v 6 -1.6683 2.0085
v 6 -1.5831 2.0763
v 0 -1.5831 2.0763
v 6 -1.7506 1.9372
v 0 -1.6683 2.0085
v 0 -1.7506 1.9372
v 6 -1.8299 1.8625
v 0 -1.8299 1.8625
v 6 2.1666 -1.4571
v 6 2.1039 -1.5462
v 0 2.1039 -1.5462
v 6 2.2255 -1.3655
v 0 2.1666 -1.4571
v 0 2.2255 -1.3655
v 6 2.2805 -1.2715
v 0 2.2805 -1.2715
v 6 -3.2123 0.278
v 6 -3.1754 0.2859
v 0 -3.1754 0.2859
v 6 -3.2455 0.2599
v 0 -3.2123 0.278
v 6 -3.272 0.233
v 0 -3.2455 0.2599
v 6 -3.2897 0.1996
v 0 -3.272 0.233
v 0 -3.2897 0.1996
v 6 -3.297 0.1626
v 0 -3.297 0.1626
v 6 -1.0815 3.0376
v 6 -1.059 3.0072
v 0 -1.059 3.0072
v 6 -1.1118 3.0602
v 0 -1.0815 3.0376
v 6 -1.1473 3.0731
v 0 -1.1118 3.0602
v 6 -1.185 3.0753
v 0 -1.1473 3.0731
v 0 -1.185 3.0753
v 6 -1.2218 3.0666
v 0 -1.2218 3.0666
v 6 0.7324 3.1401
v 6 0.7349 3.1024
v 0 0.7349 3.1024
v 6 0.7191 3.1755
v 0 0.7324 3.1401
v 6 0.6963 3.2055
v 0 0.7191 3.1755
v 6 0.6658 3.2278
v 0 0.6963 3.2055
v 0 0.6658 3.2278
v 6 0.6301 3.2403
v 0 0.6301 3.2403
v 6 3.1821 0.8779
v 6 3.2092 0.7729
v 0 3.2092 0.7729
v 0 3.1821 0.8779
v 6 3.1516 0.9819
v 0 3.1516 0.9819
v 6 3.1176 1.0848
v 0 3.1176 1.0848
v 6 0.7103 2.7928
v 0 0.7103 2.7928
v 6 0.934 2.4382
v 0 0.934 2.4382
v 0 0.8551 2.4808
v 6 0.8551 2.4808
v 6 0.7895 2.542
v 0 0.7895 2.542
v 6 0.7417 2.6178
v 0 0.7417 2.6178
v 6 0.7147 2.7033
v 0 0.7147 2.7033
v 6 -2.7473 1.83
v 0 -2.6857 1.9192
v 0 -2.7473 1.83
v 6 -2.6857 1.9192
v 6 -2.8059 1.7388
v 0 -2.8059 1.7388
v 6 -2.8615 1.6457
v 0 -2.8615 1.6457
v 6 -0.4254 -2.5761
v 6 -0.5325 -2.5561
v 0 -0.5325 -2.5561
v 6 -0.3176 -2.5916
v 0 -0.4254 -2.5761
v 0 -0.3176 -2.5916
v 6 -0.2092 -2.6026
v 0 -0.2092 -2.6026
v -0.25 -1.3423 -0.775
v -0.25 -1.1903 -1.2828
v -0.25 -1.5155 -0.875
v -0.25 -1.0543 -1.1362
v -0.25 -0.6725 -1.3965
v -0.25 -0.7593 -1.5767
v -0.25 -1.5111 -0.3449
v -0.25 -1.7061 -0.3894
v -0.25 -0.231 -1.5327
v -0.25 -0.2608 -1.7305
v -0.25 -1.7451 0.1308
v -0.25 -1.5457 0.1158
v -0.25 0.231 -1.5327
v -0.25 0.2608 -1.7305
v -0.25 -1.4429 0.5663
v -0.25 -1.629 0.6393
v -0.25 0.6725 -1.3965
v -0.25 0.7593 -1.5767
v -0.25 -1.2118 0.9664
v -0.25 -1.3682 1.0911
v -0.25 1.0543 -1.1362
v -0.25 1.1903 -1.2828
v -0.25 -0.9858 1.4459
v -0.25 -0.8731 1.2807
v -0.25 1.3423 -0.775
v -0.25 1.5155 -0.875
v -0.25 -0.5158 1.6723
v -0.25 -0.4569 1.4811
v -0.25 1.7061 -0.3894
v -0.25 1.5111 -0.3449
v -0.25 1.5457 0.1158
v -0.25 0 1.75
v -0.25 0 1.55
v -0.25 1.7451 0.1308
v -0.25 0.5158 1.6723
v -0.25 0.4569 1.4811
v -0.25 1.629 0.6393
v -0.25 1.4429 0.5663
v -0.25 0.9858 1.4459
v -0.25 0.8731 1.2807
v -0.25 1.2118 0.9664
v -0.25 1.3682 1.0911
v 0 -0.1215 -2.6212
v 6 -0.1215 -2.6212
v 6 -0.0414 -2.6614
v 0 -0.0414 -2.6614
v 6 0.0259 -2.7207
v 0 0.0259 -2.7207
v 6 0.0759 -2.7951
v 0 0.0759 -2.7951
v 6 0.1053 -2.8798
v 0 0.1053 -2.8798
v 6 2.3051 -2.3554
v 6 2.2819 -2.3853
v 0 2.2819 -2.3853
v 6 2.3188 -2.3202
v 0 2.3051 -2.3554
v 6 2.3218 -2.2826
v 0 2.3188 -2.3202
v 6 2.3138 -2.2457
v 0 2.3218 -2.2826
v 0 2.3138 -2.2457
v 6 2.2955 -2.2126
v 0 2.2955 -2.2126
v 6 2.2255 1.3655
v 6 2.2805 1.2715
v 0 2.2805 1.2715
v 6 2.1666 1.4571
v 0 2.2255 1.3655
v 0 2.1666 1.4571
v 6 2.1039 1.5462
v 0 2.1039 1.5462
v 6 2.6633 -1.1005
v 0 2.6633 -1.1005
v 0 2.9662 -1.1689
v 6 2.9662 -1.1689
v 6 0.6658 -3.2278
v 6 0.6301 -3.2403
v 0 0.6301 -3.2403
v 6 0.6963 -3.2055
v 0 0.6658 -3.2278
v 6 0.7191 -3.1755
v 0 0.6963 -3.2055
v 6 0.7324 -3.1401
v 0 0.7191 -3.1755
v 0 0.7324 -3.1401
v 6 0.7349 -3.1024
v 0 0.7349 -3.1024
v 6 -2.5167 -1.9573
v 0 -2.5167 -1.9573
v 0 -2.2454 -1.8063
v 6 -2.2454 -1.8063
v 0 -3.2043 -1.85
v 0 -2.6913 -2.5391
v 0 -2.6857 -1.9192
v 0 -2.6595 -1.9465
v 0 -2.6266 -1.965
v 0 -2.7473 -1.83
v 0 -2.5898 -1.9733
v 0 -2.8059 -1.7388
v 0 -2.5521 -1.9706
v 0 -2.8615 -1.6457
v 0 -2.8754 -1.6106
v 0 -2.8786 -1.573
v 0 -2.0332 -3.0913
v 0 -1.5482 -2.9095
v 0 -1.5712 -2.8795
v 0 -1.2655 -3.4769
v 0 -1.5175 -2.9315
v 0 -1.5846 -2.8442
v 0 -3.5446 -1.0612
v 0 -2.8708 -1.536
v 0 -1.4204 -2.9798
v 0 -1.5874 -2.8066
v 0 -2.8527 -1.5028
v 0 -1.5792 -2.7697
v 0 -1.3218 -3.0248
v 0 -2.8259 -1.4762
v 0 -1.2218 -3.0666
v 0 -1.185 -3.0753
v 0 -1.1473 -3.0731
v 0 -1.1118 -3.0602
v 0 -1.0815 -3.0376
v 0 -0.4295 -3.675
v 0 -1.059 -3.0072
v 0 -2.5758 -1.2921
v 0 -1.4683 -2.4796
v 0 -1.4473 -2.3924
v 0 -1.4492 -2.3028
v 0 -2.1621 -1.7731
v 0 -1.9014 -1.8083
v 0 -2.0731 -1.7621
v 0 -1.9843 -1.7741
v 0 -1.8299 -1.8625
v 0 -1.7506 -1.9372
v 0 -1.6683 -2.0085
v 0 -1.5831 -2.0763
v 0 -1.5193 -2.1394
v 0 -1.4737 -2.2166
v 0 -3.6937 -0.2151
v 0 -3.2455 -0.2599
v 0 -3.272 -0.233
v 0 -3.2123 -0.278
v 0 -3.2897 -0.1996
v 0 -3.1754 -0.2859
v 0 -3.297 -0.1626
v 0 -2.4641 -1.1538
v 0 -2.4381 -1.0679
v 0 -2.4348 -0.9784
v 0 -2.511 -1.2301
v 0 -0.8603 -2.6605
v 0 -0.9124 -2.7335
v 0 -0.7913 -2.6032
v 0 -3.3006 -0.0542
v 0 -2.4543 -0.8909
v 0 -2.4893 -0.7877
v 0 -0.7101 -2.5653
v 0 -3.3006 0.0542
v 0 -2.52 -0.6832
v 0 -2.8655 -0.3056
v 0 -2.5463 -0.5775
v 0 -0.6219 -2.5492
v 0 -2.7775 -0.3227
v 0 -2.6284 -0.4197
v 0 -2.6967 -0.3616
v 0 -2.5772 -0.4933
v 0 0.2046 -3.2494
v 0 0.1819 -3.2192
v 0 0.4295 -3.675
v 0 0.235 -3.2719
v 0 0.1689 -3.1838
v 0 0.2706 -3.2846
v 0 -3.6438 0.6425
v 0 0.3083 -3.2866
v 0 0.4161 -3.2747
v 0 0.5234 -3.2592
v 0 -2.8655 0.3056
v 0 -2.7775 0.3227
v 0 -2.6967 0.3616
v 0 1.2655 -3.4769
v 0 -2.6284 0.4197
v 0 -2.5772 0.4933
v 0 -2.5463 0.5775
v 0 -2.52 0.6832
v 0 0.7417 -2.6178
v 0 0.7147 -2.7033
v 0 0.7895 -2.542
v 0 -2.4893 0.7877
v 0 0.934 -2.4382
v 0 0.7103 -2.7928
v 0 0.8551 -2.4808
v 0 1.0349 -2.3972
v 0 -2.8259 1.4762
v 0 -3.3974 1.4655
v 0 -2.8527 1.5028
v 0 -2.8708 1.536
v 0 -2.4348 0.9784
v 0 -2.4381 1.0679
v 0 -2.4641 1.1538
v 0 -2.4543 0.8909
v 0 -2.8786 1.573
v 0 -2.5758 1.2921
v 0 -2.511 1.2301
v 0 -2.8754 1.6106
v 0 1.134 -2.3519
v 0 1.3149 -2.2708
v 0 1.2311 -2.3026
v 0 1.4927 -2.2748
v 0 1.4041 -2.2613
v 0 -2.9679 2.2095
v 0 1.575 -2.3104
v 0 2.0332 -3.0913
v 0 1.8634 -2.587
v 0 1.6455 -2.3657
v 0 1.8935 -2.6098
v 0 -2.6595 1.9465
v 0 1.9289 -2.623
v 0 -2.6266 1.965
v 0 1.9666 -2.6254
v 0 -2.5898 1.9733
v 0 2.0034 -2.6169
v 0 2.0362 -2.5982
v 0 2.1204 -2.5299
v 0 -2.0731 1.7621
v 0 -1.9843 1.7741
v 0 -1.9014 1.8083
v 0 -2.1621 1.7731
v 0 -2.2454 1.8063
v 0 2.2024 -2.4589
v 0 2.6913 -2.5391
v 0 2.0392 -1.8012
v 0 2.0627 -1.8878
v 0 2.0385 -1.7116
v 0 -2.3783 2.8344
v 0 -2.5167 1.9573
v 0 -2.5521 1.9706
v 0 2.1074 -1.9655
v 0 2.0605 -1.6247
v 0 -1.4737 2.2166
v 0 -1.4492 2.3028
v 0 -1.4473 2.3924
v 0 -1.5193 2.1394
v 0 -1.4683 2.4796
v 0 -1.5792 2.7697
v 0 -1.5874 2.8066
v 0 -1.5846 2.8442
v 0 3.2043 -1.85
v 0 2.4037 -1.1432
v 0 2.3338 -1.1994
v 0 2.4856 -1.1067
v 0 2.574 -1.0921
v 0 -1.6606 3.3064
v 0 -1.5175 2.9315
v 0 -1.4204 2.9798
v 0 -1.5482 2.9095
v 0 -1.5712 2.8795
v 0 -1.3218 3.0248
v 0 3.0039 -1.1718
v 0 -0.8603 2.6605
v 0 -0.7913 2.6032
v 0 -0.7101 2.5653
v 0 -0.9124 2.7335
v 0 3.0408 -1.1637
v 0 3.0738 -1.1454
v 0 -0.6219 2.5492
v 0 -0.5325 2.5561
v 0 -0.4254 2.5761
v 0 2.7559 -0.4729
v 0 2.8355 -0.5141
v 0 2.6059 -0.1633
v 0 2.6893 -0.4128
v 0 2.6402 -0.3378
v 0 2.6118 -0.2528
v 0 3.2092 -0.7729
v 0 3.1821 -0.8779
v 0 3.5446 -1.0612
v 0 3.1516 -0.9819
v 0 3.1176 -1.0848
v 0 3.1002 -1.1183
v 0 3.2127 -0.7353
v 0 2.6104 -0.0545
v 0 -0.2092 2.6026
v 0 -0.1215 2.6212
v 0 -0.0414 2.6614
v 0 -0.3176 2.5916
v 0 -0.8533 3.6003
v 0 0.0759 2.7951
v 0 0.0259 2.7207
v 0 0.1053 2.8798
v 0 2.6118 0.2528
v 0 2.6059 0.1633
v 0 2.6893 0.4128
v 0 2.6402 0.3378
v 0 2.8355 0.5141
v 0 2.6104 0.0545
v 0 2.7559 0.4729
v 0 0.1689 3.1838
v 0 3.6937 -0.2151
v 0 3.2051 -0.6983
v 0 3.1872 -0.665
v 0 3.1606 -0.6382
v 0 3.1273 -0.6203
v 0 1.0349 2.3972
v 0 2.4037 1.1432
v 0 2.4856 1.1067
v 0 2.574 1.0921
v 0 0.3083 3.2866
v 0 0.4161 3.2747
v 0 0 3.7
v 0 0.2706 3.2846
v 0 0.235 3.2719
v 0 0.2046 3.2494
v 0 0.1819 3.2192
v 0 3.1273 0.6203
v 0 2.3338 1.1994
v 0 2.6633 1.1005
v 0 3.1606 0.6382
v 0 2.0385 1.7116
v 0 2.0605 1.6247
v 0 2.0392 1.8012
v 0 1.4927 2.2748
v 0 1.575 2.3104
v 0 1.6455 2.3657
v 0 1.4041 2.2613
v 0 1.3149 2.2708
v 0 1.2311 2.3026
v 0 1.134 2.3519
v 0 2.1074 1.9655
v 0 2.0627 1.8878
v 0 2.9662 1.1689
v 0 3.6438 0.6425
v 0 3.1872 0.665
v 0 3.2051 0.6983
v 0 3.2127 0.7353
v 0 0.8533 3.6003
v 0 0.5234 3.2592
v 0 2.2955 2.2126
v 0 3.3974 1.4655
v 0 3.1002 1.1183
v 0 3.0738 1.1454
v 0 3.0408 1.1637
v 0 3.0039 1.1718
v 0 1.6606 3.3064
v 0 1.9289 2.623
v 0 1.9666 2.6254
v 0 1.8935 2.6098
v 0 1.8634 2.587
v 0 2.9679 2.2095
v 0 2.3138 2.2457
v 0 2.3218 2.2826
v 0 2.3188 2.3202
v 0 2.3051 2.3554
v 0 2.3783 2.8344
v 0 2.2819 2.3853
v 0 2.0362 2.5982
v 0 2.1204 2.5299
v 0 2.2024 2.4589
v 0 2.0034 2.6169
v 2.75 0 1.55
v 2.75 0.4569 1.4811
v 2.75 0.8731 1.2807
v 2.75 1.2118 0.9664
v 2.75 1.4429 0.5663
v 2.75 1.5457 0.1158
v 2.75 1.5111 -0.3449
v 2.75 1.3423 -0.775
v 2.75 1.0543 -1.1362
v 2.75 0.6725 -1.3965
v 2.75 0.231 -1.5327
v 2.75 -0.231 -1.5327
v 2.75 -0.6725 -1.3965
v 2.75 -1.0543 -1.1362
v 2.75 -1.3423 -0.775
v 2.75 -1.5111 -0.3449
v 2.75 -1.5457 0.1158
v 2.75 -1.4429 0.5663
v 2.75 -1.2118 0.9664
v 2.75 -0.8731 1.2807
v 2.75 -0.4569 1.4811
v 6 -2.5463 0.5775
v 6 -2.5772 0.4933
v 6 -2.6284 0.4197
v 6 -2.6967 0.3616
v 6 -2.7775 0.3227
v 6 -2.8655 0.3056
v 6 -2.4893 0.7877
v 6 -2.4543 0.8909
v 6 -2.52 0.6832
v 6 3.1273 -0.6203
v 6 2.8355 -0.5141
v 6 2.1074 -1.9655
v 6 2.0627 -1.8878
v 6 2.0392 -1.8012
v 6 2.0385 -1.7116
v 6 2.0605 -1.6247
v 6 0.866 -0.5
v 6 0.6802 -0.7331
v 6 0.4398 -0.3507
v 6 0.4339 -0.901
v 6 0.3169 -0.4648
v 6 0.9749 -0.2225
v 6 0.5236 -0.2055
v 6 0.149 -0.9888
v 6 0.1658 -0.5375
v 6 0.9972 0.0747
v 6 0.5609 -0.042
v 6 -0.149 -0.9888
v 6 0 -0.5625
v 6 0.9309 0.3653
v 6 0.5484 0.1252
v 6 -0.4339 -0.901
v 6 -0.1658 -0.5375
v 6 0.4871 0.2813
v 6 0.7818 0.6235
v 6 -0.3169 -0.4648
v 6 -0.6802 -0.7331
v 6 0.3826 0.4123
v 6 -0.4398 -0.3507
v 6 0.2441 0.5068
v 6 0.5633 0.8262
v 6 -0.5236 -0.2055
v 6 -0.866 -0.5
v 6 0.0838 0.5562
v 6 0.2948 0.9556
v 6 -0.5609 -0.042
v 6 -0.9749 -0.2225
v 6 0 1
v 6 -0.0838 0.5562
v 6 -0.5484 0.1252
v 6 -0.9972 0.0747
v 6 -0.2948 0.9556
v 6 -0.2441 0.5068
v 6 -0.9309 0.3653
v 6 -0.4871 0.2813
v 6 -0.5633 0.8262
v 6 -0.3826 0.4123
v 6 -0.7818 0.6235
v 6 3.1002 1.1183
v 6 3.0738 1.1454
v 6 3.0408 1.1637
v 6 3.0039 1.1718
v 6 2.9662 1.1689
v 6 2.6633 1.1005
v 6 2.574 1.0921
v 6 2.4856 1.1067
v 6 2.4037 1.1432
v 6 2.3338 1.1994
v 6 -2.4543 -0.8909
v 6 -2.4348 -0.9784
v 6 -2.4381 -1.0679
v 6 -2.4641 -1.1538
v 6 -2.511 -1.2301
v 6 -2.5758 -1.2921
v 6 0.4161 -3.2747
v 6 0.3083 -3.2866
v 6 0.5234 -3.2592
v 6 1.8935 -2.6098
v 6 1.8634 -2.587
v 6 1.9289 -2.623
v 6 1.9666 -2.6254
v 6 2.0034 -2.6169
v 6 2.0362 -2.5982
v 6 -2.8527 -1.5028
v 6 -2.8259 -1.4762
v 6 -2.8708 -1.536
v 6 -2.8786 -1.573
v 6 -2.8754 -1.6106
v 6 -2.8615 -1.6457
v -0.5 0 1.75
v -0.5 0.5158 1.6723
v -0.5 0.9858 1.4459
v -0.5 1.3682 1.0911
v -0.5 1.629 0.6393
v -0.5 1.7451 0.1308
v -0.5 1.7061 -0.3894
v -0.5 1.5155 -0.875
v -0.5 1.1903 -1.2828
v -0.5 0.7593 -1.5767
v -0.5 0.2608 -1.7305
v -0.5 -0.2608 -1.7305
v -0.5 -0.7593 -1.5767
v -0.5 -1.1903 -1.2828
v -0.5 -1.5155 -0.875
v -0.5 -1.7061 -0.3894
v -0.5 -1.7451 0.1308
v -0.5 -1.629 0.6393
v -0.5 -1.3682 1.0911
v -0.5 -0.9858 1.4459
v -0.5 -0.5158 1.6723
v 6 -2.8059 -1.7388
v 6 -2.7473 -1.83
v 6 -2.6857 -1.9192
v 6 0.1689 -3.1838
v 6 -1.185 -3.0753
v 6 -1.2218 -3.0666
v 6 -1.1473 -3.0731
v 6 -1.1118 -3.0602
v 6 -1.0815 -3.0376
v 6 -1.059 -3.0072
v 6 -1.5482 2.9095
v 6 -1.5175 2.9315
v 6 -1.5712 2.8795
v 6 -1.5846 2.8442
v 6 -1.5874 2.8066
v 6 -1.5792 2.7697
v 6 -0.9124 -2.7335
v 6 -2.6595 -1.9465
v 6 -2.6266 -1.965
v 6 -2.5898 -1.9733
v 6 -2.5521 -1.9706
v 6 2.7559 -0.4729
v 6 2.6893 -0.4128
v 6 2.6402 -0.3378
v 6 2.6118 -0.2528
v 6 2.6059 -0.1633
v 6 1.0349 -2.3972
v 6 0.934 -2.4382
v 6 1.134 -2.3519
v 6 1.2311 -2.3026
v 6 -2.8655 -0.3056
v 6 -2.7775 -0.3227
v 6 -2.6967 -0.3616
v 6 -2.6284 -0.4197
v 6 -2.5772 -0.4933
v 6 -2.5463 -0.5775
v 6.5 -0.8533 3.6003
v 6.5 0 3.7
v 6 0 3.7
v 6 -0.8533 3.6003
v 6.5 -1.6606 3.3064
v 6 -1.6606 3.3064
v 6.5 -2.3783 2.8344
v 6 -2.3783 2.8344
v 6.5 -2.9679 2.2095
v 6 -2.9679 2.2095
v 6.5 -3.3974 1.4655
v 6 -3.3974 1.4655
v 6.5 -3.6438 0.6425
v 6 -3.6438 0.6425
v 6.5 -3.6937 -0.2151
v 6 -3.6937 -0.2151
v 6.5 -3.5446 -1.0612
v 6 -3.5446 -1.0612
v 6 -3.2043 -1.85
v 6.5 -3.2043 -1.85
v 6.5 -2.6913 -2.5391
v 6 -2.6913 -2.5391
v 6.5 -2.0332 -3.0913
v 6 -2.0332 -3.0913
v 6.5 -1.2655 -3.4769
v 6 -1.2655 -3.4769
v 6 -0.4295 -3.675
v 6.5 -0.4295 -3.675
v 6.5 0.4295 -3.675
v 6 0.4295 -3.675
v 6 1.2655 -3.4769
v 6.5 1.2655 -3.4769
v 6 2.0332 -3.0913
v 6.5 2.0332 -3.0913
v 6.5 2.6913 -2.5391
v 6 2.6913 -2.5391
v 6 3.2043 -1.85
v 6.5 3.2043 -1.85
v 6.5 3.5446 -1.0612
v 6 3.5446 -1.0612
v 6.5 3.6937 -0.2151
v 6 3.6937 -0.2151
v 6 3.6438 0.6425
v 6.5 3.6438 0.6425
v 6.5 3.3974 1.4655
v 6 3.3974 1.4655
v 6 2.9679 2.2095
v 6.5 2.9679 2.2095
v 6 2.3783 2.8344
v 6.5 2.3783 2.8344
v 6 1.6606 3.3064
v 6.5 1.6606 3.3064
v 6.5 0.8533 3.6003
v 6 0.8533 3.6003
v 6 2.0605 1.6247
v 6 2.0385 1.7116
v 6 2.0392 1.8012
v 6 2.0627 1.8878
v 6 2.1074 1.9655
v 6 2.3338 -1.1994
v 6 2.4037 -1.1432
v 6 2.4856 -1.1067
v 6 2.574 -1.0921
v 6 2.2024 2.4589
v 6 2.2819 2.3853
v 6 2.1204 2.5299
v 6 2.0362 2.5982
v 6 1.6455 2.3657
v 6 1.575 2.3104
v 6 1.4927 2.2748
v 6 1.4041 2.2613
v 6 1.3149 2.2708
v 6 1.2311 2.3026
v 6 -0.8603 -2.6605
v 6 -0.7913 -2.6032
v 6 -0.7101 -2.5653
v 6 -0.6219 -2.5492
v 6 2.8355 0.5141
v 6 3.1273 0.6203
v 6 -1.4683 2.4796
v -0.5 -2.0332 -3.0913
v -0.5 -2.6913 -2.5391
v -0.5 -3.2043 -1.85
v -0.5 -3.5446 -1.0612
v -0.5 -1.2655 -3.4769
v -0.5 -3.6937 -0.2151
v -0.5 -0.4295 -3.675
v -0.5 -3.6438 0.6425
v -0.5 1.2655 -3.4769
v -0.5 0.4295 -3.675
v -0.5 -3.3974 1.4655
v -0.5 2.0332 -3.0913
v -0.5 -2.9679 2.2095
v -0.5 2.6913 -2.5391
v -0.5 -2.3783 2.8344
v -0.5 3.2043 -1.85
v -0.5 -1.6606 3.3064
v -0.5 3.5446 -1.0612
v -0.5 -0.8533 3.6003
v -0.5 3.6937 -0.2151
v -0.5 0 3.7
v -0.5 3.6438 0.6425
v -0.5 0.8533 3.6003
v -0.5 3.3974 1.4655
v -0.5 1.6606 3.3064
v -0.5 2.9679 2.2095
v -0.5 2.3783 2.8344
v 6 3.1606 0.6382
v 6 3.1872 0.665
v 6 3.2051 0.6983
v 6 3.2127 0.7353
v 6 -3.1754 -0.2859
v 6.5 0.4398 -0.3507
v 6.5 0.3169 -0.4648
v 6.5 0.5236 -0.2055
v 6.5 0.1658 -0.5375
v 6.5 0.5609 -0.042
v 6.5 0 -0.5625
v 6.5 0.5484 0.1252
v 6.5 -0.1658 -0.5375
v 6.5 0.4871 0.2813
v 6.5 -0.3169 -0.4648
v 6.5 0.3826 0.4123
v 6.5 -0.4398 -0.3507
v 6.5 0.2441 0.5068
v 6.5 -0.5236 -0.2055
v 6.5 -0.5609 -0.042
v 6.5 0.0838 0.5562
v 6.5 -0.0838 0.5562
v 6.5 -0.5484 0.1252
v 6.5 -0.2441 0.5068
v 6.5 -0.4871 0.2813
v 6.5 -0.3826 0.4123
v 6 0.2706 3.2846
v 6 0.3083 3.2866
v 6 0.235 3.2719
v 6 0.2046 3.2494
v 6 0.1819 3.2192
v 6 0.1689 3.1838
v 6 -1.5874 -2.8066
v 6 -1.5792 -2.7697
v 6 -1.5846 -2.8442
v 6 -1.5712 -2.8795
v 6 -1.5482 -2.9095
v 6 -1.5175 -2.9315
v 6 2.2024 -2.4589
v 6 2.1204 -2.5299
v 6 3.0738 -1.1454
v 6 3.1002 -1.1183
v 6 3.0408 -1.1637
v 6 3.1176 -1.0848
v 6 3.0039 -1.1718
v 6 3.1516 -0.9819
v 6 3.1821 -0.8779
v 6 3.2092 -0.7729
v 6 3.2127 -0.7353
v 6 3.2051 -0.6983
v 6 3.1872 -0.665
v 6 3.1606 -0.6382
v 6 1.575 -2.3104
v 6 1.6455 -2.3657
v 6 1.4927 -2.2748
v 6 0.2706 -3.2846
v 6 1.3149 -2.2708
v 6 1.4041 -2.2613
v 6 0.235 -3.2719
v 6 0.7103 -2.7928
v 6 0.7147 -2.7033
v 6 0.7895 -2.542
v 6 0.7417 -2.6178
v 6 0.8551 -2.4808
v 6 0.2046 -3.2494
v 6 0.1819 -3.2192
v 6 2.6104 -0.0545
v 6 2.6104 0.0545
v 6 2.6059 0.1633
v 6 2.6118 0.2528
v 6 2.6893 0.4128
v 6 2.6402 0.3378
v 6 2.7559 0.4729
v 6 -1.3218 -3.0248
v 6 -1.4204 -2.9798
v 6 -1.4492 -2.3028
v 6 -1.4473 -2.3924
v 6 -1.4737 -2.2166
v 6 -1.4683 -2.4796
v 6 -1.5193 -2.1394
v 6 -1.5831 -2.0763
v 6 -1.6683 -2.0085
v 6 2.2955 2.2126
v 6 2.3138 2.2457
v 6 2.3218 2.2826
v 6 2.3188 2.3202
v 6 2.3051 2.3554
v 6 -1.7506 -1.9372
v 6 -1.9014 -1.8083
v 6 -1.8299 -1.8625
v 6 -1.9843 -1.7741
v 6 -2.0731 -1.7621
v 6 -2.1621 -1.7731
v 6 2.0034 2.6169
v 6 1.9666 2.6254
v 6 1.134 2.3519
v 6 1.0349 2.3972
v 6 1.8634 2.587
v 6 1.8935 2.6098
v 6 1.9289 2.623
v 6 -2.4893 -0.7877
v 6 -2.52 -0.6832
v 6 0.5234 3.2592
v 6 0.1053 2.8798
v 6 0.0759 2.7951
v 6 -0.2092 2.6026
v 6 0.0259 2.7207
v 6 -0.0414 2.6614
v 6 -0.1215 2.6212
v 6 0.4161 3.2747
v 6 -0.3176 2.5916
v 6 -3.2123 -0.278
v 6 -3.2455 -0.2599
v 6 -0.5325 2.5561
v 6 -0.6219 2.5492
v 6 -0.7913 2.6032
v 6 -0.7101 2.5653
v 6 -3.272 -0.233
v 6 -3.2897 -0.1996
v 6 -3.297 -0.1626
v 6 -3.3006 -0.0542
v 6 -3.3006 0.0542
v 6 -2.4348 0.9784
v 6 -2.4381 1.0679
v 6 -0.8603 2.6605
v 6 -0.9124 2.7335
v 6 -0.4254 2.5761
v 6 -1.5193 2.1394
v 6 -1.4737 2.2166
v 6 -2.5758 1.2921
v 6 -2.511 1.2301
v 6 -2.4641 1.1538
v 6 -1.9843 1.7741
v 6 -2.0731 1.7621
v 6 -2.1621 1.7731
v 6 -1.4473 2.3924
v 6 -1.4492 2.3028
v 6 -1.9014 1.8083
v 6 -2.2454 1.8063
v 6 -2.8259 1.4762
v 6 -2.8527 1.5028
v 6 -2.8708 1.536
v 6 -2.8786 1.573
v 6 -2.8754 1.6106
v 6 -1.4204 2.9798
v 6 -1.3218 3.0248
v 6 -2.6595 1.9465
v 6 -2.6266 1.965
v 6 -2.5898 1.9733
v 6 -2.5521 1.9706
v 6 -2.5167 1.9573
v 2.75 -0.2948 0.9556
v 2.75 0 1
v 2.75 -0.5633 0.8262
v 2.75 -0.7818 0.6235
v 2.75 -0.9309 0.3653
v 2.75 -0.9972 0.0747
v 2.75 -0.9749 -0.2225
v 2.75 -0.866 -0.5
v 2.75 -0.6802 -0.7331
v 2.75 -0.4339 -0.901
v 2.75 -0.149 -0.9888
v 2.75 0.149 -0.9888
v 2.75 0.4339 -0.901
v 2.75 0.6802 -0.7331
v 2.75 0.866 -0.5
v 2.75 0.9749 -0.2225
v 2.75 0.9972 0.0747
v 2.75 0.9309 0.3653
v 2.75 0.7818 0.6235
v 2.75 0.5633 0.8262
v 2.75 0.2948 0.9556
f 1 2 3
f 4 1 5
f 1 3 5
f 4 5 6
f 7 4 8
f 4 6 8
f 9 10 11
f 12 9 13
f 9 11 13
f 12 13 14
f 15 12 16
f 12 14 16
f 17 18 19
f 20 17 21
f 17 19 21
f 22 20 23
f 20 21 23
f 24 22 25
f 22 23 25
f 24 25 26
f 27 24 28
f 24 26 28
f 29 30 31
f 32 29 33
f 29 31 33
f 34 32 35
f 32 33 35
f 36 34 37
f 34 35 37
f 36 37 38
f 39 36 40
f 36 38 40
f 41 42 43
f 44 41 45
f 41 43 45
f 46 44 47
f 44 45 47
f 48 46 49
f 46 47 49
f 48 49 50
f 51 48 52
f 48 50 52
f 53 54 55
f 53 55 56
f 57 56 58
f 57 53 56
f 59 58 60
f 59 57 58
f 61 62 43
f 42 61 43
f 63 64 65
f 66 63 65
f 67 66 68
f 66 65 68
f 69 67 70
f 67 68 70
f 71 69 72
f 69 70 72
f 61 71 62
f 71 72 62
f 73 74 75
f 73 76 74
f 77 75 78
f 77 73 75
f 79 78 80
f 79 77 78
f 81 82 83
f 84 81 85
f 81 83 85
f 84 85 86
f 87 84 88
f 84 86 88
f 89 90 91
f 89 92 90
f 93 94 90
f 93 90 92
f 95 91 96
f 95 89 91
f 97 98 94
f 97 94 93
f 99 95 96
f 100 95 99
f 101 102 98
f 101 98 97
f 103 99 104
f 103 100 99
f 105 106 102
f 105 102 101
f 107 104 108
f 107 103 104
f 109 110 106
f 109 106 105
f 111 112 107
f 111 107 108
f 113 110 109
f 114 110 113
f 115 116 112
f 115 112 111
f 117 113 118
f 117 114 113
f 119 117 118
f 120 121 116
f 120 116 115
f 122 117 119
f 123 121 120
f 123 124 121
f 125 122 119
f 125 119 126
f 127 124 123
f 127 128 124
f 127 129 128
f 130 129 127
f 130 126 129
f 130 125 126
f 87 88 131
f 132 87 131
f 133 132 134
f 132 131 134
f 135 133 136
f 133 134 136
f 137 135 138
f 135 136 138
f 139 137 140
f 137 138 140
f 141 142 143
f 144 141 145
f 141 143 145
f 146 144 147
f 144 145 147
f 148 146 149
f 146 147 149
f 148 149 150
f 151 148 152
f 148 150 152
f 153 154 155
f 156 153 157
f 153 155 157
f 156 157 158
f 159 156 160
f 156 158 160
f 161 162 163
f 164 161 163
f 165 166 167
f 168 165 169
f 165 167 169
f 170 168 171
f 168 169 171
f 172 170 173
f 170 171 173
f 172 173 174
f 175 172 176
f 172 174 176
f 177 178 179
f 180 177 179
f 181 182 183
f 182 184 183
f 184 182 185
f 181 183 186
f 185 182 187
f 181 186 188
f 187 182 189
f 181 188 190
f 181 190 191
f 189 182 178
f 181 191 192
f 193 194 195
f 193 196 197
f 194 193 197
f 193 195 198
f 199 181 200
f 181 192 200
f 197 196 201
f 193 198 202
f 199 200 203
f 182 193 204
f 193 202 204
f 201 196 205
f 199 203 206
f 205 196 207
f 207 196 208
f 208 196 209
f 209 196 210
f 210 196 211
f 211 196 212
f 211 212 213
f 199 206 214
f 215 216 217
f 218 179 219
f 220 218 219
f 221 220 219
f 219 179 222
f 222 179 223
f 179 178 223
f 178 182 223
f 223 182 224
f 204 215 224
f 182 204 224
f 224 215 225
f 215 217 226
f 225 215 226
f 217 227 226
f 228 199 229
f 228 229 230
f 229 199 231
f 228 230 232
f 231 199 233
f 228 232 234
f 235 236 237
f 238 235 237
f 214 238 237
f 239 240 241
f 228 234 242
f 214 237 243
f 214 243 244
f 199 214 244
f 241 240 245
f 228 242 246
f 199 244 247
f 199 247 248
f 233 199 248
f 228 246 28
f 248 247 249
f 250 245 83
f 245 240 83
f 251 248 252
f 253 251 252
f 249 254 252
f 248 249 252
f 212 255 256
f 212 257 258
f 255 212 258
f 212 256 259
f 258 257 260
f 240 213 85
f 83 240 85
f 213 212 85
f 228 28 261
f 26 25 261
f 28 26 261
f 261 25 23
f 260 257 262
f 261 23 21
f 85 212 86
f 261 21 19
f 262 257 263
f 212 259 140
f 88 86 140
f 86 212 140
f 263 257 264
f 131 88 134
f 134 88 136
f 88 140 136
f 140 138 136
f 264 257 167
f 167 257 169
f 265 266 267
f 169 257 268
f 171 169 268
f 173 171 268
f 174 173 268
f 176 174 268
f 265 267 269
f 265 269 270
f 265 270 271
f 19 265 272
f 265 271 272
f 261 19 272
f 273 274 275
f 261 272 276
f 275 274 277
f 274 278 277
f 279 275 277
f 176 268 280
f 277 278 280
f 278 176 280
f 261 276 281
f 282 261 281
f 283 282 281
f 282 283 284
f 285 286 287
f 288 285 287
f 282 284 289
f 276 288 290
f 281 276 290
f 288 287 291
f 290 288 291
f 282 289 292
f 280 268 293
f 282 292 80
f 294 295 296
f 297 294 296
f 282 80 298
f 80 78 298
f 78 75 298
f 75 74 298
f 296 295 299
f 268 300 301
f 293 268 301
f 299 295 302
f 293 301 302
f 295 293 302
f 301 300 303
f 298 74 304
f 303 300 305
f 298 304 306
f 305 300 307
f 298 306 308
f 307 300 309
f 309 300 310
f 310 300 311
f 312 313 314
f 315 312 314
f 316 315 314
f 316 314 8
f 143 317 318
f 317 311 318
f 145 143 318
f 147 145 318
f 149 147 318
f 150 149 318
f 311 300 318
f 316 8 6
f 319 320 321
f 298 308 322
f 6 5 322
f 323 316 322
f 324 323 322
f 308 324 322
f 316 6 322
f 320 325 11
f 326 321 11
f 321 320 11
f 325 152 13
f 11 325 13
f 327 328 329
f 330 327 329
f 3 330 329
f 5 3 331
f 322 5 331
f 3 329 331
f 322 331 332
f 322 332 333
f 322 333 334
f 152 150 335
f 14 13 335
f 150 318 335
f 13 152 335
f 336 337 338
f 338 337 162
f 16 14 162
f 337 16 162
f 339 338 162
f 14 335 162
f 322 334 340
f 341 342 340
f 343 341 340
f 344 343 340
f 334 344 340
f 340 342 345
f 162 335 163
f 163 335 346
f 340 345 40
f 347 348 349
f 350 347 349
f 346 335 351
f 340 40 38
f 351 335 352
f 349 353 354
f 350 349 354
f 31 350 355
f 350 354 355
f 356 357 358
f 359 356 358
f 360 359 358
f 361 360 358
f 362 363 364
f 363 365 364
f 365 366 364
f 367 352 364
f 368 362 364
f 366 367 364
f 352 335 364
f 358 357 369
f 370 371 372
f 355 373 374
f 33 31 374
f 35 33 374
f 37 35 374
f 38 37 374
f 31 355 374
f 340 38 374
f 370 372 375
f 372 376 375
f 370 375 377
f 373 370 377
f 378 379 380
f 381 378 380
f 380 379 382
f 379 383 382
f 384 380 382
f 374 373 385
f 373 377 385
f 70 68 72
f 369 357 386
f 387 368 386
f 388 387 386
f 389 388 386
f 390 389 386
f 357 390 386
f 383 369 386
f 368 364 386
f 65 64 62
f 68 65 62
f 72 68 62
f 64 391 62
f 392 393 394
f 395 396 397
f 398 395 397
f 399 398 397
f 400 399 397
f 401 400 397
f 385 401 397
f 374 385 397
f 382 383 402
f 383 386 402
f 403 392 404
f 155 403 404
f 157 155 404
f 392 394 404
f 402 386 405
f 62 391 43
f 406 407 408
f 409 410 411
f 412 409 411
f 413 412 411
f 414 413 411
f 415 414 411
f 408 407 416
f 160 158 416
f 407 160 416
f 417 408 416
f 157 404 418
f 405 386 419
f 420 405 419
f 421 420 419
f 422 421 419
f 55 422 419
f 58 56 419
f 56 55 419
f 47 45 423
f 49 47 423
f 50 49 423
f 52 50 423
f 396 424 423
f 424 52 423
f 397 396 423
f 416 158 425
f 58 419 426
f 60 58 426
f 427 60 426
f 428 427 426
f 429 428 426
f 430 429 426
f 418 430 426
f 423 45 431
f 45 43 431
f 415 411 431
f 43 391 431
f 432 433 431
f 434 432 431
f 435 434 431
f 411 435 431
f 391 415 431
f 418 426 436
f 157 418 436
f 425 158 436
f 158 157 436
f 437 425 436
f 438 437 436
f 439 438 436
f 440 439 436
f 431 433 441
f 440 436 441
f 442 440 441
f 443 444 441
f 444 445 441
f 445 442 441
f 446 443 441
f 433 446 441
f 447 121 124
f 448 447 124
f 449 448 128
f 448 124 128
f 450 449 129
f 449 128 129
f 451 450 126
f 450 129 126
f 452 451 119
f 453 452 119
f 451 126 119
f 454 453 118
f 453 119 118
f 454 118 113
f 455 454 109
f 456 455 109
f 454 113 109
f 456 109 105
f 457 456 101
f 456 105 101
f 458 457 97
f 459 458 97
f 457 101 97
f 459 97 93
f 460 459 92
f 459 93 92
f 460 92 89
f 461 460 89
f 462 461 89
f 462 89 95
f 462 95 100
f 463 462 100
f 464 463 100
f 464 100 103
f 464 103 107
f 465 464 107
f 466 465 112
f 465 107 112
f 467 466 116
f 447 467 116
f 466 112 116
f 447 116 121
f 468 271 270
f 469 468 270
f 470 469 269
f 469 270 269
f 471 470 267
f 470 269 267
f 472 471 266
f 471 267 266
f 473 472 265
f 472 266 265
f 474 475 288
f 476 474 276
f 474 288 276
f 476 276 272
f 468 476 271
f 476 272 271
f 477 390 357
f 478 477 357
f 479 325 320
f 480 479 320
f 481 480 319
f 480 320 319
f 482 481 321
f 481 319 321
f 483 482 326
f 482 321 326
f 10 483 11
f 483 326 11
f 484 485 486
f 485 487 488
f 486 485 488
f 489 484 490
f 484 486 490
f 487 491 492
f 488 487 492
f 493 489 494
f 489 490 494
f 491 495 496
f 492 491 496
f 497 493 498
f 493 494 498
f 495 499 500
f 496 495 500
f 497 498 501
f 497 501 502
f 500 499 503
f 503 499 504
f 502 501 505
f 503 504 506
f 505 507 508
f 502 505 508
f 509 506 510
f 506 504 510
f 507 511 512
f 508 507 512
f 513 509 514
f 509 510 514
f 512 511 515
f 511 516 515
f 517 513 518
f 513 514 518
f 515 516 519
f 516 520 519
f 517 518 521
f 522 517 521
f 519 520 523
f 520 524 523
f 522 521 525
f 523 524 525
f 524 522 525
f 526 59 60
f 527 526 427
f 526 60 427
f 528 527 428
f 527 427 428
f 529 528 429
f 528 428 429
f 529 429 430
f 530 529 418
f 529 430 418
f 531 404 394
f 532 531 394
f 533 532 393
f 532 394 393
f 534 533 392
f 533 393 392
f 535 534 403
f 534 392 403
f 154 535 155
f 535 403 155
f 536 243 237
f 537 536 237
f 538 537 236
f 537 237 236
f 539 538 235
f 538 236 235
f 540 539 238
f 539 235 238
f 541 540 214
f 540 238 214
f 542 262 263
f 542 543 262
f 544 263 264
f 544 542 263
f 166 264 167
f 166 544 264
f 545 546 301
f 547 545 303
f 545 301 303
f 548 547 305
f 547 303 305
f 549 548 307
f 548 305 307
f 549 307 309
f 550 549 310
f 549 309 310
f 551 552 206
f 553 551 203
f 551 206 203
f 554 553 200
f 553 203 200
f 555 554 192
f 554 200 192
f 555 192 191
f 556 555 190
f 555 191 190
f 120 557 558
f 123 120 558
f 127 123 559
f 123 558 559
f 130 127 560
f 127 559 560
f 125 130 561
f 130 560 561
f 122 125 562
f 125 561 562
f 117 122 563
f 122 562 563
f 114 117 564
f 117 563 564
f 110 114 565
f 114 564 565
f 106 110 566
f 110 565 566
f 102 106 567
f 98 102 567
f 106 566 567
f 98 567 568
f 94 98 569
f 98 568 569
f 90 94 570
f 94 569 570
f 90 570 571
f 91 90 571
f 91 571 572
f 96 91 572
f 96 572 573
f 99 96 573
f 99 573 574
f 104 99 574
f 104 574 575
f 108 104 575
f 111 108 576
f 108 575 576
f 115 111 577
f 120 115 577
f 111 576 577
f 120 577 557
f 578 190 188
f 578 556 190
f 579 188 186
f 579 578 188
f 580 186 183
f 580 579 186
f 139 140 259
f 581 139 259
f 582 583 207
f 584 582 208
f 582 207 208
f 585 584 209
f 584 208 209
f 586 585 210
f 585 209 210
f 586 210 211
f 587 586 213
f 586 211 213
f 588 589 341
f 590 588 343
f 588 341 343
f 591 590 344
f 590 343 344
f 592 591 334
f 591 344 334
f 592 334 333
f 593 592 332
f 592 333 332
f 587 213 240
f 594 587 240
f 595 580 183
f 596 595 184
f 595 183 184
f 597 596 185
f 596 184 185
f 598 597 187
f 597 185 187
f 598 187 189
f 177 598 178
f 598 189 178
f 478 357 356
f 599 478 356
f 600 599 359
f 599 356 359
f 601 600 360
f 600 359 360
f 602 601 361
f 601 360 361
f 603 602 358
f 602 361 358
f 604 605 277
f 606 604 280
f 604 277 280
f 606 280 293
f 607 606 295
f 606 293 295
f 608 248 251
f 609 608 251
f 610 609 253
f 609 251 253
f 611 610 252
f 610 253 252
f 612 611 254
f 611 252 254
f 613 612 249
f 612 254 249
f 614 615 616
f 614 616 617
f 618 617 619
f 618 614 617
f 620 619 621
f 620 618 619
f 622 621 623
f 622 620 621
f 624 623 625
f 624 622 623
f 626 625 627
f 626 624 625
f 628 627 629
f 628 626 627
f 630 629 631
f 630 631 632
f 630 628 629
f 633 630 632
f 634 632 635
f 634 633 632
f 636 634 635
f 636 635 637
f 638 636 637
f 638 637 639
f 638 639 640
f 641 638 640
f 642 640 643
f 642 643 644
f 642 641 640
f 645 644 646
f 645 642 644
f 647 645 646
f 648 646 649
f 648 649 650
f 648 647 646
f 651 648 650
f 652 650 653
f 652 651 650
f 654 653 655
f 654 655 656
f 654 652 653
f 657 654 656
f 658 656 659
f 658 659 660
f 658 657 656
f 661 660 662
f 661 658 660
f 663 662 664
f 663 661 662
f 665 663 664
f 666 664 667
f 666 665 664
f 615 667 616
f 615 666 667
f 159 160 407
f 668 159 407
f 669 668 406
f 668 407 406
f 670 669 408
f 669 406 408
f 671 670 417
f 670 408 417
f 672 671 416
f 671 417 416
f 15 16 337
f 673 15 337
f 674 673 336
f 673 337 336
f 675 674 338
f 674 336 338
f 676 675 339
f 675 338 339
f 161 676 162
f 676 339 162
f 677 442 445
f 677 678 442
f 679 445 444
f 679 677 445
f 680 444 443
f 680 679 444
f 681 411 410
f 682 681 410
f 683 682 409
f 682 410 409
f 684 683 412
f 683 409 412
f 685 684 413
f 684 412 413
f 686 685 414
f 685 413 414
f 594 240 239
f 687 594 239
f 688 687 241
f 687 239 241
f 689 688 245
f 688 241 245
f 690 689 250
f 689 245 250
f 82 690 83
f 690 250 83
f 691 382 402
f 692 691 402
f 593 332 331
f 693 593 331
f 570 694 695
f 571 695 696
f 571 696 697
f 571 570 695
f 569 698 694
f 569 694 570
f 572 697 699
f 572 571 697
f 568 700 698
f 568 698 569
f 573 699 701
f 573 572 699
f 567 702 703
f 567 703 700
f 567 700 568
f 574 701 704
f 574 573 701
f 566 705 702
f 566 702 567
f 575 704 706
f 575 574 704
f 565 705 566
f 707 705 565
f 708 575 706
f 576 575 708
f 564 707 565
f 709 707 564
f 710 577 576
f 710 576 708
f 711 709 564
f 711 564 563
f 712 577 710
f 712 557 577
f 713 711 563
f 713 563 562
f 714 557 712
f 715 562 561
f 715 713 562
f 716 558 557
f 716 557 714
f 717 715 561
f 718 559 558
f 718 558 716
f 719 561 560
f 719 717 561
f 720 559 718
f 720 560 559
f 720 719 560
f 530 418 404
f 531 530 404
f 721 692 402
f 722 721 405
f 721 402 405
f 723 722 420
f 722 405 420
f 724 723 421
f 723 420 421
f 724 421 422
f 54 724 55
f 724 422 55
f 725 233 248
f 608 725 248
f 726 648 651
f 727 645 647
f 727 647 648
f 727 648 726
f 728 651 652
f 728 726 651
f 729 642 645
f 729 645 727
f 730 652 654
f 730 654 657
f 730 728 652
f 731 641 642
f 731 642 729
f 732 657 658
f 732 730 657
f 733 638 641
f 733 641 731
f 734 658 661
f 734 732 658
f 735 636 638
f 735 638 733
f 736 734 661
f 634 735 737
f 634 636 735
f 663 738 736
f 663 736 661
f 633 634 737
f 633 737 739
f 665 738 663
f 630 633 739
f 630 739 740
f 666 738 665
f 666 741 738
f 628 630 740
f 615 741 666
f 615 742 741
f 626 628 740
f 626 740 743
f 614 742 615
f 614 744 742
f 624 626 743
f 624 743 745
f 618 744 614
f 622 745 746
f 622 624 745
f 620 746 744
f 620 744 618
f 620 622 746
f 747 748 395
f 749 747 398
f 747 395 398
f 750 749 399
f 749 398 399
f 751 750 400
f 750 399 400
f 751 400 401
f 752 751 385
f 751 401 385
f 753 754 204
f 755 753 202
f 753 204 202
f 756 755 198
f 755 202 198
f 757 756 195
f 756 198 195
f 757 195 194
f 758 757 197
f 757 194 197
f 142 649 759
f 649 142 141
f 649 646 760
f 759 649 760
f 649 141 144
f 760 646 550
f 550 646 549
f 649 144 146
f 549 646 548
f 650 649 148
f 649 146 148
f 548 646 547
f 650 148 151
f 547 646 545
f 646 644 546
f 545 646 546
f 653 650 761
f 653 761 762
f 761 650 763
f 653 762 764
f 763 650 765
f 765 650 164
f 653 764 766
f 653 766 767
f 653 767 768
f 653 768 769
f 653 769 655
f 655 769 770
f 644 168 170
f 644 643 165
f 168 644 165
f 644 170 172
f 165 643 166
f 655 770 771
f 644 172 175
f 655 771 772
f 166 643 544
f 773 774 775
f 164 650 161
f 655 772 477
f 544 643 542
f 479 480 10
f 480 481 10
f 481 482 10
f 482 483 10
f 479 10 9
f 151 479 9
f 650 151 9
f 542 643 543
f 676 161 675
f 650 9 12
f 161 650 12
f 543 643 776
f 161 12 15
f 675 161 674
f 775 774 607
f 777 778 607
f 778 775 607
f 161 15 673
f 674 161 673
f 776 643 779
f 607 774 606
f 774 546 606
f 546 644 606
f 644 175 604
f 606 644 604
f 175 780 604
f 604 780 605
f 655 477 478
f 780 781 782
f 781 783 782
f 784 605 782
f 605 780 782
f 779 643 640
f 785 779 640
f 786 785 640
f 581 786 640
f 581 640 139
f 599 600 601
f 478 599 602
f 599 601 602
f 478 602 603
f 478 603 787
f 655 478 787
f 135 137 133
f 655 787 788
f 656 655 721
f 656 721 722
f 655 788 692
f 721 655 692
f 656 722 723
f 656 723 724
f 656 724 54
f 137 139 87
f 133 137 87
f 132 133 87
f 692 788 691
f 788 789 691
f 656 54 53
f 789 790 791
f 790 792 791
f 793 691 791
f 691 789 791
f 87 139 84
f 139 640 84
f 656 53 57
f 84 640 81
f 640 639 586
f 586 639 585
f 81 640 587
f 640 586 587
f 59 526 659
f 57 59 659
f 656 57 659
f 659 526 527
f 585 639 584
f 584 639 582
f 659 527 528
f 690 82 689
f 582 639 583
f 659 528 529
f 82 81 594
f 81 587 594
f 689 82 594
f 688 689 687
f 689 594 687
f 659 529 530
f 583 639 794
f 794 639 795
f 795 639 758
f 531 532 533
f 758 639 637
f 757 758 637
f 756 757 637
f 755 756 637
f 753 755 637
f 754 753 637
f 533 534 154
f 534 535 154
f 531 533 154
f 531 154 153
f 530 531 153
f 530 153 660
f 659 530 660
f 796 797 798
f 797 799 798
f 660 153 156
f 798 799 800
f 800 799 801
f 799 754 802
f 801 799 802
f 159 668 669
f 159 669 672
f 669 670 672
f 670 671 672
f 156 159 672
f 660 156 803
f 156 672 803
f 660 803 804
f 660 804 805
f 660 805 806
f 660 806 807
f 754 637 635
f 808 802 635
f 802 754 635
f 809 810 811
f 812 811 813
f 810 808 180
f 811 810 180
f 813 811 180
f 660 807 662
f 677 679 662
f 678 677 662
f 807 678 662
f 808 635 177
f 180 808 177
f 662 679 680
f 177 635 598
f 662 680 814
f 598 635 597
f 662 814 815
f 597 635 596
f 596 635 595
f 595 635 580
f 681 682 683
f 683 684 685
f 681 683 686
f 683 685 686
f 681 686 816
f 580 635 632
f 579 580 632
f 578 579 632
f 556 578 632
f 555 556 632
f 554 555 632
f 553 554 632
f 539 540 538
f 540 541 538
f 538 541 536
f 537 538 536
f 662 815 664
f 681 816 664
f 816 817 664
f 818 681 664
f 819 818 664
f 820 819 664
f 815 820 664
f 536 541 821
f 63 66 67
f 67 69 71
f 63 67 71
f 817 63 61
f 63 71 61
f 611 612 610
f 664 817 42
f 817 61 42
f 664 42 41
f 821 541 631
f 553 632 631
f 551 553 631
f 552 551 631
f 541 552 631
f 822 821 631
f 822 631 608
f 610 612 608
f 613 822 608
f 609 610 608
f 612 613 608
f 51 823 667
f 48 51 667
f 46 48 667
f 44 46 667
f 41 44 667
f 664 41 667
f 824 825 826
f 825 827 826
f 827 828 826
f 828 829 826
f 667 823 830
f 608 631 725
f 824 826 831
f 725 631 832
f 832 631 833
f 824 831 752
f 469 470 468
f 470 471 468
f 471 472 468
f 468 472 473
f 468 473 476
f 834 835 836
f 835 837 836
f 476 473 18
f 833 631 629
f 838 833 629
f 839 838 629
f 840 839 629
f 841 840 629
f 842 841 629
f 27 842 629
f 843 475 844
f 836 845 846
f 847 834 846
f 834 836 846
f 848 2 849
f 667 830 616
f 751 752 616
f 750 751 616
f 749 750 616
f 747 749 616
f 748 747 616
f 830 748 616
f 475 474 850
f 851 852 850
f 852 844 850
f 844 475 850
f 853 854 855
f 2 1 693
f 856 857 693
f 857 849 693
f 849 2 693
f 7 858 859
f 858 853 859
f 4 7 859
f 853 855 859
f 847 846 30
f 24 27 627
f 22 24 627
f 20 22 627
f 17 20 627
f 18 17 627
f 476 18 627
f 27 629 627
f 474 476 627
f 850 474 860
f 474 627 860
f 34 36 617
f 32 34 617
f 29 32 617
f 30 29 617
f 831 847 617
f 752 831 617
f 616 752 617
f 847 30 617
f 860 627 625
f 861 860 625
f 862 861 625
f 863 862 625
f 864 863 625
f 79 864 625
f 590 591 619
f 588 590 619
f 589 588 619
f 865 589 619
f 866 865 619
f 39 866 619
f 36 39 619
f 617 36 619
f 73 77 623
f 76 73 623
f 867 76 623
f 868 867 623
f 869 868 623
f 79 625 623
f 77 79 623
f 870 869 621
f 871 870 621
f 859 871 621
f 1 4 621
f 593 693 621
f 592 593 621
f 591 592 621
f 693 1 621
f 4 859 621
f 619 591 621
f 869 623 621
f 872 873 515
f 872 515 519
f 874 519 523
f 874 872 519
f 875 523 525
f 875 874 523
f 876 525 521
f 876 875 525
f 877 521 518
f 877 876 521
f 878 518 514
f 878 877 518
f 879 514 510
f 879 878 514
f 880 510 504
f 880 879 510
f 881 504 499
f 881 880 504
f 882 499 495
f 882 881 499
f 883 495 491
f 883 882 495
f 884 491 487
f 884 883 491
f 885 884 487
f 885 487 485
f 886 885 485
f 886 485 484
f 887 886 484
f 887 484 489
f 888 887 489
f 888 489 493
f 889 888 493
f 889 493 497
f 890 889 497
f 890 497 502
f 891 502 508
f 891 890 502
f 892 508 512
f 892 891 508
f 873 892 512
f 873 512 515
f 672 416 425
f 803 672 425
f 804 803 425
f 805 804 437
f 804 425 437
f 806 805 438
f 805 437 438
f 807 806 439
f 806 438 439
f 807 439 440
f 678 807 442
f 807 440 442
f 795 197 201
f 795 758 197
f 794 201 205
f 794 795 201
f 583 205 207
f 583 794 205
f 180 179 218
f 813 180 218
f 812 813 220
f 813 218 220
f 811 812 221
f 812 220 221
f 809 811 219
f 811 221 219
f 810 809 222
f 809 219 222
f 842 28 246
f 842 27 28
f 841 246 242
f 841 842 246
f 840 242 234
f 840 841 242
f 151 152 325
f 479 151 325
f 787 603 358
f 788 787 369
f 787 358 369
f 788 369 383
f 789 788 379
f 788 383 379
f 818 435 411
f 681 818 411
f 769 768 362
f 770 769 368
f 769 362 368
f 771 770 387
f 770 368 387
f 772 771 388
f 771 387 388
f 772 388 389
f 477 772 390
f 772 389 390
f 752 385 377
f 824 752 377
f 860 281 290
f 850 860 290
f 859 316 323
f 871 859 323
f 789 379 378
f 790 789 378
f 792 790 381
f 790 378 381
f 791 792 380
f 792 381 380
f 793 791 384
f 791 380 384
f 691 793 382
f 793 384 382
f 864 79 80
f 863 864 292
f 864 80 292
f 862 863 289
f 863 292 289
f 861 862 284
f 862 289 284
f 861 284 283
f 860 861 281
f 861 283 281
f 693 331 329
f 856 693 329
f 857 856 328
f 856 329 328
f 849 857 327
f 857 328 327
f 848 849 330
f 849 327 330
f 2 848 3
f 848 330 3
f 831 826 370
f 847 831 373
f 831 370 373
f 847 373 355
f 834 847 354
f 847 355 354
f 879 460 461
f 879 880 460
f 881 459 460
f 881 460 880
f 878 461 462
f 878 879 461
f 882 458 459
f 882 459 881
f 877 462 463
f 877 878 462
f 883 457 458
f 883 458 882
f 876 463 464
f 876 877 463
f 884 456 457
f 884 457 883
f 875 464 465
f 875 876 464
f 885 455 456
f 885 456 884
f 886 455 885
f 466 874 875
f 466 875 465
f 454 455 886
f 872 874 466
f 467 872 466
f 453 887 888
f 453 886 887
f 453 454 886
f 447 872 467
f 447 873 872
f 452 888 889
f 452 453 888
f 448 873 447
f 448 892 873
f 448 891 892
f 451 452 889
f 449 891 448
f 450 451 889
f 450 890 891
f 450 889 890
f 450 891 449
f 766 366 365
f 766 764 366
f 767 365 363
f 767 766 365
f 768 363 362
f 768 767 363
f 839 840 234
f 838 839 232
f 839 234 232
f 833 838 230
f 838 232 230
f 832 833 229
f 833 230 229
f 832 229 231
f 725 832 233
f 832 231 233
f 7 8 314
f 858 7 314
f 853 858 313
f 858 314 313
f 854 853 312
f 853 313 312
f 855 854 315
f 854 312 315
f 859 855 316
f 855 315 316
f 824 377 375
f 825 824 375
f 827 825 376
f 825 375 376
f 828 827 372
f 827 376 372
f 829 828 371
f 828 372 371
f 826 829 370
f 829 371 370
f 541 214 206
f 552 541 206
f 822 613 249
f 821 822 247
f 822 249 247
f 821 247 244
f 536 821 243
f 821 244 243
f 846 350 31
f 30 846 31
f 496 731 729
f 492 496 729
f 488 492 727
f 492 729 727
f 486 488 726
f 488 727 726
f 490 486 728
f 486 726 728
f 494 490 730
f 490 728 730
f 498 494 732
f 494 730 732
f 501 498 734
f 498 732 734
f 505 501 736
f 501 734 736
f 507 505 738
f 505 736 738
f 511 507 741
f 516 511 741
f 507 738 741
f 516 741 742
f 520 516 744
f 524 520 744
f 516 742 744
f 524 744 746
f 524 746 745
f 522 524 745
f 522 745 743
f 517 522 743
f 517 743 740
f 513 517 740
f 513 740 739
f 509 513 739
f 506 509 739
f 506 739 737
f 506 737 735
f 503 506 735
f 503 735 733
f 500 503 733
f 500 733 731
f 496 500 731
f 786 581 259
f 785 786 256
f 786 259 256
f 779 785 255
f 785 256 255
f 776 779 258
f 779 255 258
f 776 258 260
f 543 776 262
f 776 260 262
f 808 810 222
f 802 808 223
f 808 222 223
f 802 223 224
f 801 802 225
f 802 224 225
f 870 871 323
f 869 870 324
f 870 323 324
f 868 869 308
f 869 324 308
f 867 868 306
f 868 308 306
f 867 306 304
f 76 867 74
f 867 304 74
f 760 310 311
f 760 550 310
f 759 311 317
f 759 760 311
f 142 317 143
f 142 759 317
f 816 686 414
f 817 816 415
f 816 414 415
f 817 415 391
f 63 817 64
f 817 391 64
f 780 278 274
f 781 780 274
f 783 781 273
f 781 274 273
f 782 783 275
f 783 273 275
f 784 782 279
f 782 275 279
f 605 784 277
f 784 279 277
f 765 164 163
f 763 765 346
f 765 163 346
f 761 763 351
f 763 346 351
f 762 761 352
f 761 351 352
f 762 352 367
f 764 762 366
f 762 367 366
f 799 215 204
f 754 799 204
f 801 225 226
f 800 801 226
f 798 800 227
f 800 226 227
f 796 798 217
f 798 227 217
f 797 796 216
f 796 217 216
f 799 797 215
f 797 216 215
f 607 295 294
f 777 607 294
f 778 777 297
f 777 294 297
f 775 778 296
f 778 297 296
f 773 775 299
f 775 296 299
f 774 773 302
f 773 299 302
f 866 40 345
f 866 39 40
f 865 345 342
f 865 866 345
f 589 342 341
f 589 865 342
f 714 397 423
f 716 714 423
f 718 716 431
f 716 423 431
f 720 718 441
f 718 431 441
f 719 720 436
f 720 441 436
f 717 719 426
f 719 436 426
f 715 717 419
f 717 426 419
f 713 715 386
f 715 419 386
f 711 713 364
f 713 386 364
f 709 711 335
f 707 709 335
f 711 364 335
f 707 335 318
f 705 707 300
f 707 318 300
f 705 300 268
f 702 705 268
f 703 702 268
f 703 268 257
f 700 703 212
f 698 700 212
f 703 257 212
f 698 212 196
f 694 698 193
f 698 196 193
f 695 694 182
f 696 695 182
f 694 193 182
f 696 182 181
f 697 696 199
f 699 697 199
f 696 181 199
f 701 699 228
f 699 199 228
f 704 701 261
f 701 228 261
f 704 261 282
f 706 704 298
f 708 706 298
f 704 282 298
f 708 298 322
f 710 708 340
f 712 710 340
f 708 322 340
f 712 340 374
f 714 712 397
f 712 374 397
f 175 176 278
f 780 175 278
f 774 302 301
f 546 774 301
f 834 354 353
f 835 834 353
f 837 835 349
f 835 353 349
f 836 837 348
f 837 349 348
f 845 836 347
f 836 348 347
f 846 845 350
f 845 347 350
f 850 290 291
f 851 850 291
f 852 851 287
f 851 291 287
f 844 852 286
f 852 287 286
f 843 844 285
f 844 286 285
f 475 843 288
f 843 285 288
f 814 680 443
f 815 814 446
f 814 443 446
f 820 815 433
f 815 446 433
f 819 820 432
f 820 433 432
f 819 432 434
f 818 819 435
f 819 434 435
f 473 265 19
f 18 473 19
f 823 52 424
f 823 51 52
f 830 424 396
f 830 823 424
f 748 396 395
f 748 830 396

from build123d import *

# Parameters (mm, degrees)
CUT_EXTRUDE_2_REACH      = 9.602
PATTERN_CIRCULAR_3_COUNT = 11
SKETCH_7_R               = 3.7
EXTRUDE_1_DEPTH          = 0.5
SKETCH_8_R               = 1.75
CUT_EXTRUDE_3_DEPTH      = 0.25
EXTRUDE_START            = 0.5
SKETCH_9_R               = 3.7
EXTRUDE_2_DEPTH          = 0.5
SKETCH_11_R              = 1.55
CUT_EXTRUDE_5_DEPTH      = 3
SKETCH_13_R              = 0.5625
CUT_EXTRUDE_7_DEPTH      = 9.739565207


with BuildPart() as part:
    # 草图1 → 旋转1 (revolve)
    with BuildSketch(Plane.XY):
        Polygon((0, 1), (0, 3.301), (6, 3.301), (6, 2.2264), (6, 1), align=None)
    revolve(axis=Axis((0, 0, 0), (1, 0, 0)))

    # 草图6 → 切除-拉伸2 (cut, up to next)
    with BuildSketch(Plane(origin=(0, 0, 0), x_dir=(0, 0, -1), z_dir=(1, 0, 0)), mode=Mode.PRIVATE) as cut_extrude_2_sk1:
        with BuildLine():
            Line((0.620299767, 3.127317535), (0.514085384, 2.835495915))
            ThreePointArc((0.514085384, 2.835495915), (0.376876254, 2.662359121), (0.163302545, 2.605888194))
            ThreePointArc((0.163302545, 2.605888194), (0, 2.611), (-0.163302545, 2.605888194))
            ThreePointArc((-0.163302545, 2.605888194), (-0.376876254, 2.662359121), (-0.514085384, 2.835495915))
            Line((-0.514085384, 2.835495915), (-0.620299767, 3.127317535))
            ThreePointArc((-0.620299767, 3.127317535), (-0.680969197, 3.197392704), (-0.772898084, 3.209241273))
            ThreePointArc((-0.772898084, 3.209241273), (-0.835941408, 3.193399906), (-0.898660577, 3.176320224))
            Line((-0.898660577, 3.176320224), (-1.396756451, 4.544827391))
            ThreePointArc((-1.396756451, 4.544827391), (0, 4.754617188), (1.396756451, 4.544827391))
            Line((1.396756451, 4.544827391), (0.898660577, 3.176320224))
            ThreePointArc((0.898660577, 3.176320224), (0.835941408, 3.193399906), (0.772898084, 3.209241273))
            ThreePointArc((0.772898084, 3.209241273), (0.680969197, 3.197392704), (0.620299767, 3.127317535))
        make_face()
    cut_extrude_2_tool1 = extrude(cut_extrude_2_sk1.sketch, amount=CUT_EXTRUDE_2_REACH, mode=Mode.PRIVATE) & part.part
    cut_extrude_2 = cut_extrude_2_tool1.solids().sort_by_distance((0, 3.839085, 0))[0]
    add(cut_extrude_2, mode=Mode.SUBTRACT)

    # 阵列(圆周)3: 切除-拉伸2 ×11 about axis
    pattern_circular_3_axis = Axis((-72.503953235, 0, 0), (1, 0, 0))
    for i in range(1, PATTERN_CIRCULAR_3_COUNT):
        add(cut_extrude_2.rotate(pattern_circular_3_axis, i * 360 / PATTERN_CIRCULAR_3_COUNT), mode=Mode.SUBTRACT)

    # 草图7 → 凸台-拉伸1 (add)
    with BuildSketch(Plane.ZY):
        Circle(SKETCH_7_R)
    extrude(amount=EXTRUDE_1_DEPTH)

    # 草图8 → 切除-拉伸3 (cut)
    with BuildSketch(Plane.ZY.offset(0.5)):
        Circle(SKETCH_8_R)
    extrude(amount=-CUT_EXTRUDE_3_DEPTH, mode=Mode.SUBTRACT)

    # 草图9 → 凸台-拉伸2 (add)
    with BuildSketch(Plane(origin=(6, 0, 0), x_dir=(0, 0, -1), z_dir=(1, 0, 0)).offset(EXTRUDE_START)):
        Circle(SKETCH_9_R)
    extrude(amount=-EXTRUDE_2_DEPTH)

    # 草图11 → 切除-拉伸5 (cut)
    with BuildSketch(Plane.ZY.offset(0.25)):
        Circle(SKETCH_11_R)
    extrude(amount=-CUT_EXTRUDE_5_DEPTH, mode=Mode.SUBTRACT)

    # 草图13 → 切除-拉伸7 (cut, through all)
    with BuildSketch(Plane(origin=(6.5, 0, 0), x_dir=(0, 0, -1), z_dir=(1, 0, 0))):
        Circle(SKETCH_13_R)
    extrude(amount=-CUT_EXTRUDE_7_DEPTH, mode=Mode.SUBTRACT)


solid = part.part
